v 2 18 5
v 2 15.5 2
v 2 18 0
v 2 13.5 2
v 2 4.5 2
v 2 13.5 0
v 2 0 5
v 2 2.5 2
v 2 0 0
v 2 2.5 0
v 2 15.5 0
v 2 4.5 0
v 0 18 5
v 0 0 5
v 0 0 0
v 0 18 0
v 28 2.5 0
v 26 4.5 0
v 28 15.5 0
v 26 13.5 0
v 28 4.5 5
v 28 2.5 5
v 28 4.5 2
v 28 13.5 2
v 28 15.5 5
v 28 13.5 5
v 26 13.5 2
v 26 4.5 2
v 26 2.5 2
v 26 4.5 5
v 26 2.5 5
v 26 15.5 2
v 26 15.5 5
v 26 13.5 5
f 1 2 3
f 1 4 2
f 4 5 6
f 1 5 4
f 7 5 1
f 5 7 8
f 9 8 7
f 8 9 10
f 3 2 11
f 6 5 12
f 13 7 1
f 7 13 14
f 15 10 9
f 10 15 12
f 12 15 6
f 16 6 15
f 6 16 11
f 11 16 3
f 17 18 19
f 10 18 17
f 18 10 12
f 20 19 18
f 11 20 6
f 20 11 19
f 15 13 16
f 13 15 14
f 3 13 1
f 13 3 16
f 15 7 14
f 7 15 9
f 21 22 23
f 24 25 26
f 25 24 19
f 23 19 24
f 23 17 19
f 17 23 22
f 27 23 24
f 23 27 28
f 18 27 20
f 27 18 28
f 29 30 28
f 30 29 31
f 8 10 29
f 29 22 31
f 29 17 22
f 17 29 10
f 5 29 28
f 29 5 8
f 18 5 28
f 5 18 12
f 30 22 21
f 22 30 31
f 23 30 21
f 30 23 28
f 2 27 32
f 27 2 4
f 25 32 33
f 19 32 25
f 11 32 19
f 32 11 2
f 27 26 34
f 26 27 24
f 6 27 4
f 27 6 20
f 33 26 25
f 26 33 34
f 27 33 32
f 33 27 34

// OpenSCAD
// ‎3,8 x 2,1 x 0,9 cm
// 1,8 / 2,4 / 2,5 x 0,45-0,9-0,45 / 1,8 x 0,3 / 0,45

outer_diameter = 70;
outer_thickness = 5;
inner_thickness = 3;

outer_radius_outer = outer_diameter / 2;
outer_radius_inner = ( outer_diameter / 2) - outer_thickness;
inner_radius_outer = outer_radius_inner;
inner_radius_inner = outer_radius_inner - inner_thickness;

module battery(){
  color("blue", 0.5)
  cube([38, 21, 9], center = true);
}

module esp(){
//  color("green", 0.5)
  cube([24, 18, 3]);
    
  translate([18,4.5,3])
  cube([9, 7.5, 3.5]);
}

module inner() {
  difference() {
    sphere(inner_radius_outer, $fn=100);
    sphere(inner_radius_inner, $fn=100);
  }
}

module outer() {
  difference() {
    sphere(outer_radius_outer, $fn=100);
    sphere(outer_radius_inner, $fn=100);
  }
}

module upper_cube() {
  size = outer_diameter + 5;
  translate([-size/2,-size/2,0])
  cube([size,size,size/2]);
}

module innerUpper() {
  intersection() {
    upper_cube();
    inner();
  }        
}

module outerUpper() {
  intersection() {
    upper_cube();
    outer();
  }        
}

module auflage(){
  cube([2,18,5]);

  translate([26,2.5,0])
  cube([2,12,2]);

  translate([0,2.5,0])
  cube([28,2,2]);
  translate([26,2.5,0])
  cube([2,2,5]);

  translate([0,13.5,0])
  cube([28,2,2]);
  translate([26,13.5,0])
  cube([2,2,5]);
    

}
auflage();
//color("red", 0.25)
//esp();
//difference(){
//  color("red", 0.25)
//  translate([-1,-1,0])
//  cube([25, 20, 8.5]);
//  esp();
//}
//battery();
//color("red", 0.25)
//innerUpper();
//outerUpper();
